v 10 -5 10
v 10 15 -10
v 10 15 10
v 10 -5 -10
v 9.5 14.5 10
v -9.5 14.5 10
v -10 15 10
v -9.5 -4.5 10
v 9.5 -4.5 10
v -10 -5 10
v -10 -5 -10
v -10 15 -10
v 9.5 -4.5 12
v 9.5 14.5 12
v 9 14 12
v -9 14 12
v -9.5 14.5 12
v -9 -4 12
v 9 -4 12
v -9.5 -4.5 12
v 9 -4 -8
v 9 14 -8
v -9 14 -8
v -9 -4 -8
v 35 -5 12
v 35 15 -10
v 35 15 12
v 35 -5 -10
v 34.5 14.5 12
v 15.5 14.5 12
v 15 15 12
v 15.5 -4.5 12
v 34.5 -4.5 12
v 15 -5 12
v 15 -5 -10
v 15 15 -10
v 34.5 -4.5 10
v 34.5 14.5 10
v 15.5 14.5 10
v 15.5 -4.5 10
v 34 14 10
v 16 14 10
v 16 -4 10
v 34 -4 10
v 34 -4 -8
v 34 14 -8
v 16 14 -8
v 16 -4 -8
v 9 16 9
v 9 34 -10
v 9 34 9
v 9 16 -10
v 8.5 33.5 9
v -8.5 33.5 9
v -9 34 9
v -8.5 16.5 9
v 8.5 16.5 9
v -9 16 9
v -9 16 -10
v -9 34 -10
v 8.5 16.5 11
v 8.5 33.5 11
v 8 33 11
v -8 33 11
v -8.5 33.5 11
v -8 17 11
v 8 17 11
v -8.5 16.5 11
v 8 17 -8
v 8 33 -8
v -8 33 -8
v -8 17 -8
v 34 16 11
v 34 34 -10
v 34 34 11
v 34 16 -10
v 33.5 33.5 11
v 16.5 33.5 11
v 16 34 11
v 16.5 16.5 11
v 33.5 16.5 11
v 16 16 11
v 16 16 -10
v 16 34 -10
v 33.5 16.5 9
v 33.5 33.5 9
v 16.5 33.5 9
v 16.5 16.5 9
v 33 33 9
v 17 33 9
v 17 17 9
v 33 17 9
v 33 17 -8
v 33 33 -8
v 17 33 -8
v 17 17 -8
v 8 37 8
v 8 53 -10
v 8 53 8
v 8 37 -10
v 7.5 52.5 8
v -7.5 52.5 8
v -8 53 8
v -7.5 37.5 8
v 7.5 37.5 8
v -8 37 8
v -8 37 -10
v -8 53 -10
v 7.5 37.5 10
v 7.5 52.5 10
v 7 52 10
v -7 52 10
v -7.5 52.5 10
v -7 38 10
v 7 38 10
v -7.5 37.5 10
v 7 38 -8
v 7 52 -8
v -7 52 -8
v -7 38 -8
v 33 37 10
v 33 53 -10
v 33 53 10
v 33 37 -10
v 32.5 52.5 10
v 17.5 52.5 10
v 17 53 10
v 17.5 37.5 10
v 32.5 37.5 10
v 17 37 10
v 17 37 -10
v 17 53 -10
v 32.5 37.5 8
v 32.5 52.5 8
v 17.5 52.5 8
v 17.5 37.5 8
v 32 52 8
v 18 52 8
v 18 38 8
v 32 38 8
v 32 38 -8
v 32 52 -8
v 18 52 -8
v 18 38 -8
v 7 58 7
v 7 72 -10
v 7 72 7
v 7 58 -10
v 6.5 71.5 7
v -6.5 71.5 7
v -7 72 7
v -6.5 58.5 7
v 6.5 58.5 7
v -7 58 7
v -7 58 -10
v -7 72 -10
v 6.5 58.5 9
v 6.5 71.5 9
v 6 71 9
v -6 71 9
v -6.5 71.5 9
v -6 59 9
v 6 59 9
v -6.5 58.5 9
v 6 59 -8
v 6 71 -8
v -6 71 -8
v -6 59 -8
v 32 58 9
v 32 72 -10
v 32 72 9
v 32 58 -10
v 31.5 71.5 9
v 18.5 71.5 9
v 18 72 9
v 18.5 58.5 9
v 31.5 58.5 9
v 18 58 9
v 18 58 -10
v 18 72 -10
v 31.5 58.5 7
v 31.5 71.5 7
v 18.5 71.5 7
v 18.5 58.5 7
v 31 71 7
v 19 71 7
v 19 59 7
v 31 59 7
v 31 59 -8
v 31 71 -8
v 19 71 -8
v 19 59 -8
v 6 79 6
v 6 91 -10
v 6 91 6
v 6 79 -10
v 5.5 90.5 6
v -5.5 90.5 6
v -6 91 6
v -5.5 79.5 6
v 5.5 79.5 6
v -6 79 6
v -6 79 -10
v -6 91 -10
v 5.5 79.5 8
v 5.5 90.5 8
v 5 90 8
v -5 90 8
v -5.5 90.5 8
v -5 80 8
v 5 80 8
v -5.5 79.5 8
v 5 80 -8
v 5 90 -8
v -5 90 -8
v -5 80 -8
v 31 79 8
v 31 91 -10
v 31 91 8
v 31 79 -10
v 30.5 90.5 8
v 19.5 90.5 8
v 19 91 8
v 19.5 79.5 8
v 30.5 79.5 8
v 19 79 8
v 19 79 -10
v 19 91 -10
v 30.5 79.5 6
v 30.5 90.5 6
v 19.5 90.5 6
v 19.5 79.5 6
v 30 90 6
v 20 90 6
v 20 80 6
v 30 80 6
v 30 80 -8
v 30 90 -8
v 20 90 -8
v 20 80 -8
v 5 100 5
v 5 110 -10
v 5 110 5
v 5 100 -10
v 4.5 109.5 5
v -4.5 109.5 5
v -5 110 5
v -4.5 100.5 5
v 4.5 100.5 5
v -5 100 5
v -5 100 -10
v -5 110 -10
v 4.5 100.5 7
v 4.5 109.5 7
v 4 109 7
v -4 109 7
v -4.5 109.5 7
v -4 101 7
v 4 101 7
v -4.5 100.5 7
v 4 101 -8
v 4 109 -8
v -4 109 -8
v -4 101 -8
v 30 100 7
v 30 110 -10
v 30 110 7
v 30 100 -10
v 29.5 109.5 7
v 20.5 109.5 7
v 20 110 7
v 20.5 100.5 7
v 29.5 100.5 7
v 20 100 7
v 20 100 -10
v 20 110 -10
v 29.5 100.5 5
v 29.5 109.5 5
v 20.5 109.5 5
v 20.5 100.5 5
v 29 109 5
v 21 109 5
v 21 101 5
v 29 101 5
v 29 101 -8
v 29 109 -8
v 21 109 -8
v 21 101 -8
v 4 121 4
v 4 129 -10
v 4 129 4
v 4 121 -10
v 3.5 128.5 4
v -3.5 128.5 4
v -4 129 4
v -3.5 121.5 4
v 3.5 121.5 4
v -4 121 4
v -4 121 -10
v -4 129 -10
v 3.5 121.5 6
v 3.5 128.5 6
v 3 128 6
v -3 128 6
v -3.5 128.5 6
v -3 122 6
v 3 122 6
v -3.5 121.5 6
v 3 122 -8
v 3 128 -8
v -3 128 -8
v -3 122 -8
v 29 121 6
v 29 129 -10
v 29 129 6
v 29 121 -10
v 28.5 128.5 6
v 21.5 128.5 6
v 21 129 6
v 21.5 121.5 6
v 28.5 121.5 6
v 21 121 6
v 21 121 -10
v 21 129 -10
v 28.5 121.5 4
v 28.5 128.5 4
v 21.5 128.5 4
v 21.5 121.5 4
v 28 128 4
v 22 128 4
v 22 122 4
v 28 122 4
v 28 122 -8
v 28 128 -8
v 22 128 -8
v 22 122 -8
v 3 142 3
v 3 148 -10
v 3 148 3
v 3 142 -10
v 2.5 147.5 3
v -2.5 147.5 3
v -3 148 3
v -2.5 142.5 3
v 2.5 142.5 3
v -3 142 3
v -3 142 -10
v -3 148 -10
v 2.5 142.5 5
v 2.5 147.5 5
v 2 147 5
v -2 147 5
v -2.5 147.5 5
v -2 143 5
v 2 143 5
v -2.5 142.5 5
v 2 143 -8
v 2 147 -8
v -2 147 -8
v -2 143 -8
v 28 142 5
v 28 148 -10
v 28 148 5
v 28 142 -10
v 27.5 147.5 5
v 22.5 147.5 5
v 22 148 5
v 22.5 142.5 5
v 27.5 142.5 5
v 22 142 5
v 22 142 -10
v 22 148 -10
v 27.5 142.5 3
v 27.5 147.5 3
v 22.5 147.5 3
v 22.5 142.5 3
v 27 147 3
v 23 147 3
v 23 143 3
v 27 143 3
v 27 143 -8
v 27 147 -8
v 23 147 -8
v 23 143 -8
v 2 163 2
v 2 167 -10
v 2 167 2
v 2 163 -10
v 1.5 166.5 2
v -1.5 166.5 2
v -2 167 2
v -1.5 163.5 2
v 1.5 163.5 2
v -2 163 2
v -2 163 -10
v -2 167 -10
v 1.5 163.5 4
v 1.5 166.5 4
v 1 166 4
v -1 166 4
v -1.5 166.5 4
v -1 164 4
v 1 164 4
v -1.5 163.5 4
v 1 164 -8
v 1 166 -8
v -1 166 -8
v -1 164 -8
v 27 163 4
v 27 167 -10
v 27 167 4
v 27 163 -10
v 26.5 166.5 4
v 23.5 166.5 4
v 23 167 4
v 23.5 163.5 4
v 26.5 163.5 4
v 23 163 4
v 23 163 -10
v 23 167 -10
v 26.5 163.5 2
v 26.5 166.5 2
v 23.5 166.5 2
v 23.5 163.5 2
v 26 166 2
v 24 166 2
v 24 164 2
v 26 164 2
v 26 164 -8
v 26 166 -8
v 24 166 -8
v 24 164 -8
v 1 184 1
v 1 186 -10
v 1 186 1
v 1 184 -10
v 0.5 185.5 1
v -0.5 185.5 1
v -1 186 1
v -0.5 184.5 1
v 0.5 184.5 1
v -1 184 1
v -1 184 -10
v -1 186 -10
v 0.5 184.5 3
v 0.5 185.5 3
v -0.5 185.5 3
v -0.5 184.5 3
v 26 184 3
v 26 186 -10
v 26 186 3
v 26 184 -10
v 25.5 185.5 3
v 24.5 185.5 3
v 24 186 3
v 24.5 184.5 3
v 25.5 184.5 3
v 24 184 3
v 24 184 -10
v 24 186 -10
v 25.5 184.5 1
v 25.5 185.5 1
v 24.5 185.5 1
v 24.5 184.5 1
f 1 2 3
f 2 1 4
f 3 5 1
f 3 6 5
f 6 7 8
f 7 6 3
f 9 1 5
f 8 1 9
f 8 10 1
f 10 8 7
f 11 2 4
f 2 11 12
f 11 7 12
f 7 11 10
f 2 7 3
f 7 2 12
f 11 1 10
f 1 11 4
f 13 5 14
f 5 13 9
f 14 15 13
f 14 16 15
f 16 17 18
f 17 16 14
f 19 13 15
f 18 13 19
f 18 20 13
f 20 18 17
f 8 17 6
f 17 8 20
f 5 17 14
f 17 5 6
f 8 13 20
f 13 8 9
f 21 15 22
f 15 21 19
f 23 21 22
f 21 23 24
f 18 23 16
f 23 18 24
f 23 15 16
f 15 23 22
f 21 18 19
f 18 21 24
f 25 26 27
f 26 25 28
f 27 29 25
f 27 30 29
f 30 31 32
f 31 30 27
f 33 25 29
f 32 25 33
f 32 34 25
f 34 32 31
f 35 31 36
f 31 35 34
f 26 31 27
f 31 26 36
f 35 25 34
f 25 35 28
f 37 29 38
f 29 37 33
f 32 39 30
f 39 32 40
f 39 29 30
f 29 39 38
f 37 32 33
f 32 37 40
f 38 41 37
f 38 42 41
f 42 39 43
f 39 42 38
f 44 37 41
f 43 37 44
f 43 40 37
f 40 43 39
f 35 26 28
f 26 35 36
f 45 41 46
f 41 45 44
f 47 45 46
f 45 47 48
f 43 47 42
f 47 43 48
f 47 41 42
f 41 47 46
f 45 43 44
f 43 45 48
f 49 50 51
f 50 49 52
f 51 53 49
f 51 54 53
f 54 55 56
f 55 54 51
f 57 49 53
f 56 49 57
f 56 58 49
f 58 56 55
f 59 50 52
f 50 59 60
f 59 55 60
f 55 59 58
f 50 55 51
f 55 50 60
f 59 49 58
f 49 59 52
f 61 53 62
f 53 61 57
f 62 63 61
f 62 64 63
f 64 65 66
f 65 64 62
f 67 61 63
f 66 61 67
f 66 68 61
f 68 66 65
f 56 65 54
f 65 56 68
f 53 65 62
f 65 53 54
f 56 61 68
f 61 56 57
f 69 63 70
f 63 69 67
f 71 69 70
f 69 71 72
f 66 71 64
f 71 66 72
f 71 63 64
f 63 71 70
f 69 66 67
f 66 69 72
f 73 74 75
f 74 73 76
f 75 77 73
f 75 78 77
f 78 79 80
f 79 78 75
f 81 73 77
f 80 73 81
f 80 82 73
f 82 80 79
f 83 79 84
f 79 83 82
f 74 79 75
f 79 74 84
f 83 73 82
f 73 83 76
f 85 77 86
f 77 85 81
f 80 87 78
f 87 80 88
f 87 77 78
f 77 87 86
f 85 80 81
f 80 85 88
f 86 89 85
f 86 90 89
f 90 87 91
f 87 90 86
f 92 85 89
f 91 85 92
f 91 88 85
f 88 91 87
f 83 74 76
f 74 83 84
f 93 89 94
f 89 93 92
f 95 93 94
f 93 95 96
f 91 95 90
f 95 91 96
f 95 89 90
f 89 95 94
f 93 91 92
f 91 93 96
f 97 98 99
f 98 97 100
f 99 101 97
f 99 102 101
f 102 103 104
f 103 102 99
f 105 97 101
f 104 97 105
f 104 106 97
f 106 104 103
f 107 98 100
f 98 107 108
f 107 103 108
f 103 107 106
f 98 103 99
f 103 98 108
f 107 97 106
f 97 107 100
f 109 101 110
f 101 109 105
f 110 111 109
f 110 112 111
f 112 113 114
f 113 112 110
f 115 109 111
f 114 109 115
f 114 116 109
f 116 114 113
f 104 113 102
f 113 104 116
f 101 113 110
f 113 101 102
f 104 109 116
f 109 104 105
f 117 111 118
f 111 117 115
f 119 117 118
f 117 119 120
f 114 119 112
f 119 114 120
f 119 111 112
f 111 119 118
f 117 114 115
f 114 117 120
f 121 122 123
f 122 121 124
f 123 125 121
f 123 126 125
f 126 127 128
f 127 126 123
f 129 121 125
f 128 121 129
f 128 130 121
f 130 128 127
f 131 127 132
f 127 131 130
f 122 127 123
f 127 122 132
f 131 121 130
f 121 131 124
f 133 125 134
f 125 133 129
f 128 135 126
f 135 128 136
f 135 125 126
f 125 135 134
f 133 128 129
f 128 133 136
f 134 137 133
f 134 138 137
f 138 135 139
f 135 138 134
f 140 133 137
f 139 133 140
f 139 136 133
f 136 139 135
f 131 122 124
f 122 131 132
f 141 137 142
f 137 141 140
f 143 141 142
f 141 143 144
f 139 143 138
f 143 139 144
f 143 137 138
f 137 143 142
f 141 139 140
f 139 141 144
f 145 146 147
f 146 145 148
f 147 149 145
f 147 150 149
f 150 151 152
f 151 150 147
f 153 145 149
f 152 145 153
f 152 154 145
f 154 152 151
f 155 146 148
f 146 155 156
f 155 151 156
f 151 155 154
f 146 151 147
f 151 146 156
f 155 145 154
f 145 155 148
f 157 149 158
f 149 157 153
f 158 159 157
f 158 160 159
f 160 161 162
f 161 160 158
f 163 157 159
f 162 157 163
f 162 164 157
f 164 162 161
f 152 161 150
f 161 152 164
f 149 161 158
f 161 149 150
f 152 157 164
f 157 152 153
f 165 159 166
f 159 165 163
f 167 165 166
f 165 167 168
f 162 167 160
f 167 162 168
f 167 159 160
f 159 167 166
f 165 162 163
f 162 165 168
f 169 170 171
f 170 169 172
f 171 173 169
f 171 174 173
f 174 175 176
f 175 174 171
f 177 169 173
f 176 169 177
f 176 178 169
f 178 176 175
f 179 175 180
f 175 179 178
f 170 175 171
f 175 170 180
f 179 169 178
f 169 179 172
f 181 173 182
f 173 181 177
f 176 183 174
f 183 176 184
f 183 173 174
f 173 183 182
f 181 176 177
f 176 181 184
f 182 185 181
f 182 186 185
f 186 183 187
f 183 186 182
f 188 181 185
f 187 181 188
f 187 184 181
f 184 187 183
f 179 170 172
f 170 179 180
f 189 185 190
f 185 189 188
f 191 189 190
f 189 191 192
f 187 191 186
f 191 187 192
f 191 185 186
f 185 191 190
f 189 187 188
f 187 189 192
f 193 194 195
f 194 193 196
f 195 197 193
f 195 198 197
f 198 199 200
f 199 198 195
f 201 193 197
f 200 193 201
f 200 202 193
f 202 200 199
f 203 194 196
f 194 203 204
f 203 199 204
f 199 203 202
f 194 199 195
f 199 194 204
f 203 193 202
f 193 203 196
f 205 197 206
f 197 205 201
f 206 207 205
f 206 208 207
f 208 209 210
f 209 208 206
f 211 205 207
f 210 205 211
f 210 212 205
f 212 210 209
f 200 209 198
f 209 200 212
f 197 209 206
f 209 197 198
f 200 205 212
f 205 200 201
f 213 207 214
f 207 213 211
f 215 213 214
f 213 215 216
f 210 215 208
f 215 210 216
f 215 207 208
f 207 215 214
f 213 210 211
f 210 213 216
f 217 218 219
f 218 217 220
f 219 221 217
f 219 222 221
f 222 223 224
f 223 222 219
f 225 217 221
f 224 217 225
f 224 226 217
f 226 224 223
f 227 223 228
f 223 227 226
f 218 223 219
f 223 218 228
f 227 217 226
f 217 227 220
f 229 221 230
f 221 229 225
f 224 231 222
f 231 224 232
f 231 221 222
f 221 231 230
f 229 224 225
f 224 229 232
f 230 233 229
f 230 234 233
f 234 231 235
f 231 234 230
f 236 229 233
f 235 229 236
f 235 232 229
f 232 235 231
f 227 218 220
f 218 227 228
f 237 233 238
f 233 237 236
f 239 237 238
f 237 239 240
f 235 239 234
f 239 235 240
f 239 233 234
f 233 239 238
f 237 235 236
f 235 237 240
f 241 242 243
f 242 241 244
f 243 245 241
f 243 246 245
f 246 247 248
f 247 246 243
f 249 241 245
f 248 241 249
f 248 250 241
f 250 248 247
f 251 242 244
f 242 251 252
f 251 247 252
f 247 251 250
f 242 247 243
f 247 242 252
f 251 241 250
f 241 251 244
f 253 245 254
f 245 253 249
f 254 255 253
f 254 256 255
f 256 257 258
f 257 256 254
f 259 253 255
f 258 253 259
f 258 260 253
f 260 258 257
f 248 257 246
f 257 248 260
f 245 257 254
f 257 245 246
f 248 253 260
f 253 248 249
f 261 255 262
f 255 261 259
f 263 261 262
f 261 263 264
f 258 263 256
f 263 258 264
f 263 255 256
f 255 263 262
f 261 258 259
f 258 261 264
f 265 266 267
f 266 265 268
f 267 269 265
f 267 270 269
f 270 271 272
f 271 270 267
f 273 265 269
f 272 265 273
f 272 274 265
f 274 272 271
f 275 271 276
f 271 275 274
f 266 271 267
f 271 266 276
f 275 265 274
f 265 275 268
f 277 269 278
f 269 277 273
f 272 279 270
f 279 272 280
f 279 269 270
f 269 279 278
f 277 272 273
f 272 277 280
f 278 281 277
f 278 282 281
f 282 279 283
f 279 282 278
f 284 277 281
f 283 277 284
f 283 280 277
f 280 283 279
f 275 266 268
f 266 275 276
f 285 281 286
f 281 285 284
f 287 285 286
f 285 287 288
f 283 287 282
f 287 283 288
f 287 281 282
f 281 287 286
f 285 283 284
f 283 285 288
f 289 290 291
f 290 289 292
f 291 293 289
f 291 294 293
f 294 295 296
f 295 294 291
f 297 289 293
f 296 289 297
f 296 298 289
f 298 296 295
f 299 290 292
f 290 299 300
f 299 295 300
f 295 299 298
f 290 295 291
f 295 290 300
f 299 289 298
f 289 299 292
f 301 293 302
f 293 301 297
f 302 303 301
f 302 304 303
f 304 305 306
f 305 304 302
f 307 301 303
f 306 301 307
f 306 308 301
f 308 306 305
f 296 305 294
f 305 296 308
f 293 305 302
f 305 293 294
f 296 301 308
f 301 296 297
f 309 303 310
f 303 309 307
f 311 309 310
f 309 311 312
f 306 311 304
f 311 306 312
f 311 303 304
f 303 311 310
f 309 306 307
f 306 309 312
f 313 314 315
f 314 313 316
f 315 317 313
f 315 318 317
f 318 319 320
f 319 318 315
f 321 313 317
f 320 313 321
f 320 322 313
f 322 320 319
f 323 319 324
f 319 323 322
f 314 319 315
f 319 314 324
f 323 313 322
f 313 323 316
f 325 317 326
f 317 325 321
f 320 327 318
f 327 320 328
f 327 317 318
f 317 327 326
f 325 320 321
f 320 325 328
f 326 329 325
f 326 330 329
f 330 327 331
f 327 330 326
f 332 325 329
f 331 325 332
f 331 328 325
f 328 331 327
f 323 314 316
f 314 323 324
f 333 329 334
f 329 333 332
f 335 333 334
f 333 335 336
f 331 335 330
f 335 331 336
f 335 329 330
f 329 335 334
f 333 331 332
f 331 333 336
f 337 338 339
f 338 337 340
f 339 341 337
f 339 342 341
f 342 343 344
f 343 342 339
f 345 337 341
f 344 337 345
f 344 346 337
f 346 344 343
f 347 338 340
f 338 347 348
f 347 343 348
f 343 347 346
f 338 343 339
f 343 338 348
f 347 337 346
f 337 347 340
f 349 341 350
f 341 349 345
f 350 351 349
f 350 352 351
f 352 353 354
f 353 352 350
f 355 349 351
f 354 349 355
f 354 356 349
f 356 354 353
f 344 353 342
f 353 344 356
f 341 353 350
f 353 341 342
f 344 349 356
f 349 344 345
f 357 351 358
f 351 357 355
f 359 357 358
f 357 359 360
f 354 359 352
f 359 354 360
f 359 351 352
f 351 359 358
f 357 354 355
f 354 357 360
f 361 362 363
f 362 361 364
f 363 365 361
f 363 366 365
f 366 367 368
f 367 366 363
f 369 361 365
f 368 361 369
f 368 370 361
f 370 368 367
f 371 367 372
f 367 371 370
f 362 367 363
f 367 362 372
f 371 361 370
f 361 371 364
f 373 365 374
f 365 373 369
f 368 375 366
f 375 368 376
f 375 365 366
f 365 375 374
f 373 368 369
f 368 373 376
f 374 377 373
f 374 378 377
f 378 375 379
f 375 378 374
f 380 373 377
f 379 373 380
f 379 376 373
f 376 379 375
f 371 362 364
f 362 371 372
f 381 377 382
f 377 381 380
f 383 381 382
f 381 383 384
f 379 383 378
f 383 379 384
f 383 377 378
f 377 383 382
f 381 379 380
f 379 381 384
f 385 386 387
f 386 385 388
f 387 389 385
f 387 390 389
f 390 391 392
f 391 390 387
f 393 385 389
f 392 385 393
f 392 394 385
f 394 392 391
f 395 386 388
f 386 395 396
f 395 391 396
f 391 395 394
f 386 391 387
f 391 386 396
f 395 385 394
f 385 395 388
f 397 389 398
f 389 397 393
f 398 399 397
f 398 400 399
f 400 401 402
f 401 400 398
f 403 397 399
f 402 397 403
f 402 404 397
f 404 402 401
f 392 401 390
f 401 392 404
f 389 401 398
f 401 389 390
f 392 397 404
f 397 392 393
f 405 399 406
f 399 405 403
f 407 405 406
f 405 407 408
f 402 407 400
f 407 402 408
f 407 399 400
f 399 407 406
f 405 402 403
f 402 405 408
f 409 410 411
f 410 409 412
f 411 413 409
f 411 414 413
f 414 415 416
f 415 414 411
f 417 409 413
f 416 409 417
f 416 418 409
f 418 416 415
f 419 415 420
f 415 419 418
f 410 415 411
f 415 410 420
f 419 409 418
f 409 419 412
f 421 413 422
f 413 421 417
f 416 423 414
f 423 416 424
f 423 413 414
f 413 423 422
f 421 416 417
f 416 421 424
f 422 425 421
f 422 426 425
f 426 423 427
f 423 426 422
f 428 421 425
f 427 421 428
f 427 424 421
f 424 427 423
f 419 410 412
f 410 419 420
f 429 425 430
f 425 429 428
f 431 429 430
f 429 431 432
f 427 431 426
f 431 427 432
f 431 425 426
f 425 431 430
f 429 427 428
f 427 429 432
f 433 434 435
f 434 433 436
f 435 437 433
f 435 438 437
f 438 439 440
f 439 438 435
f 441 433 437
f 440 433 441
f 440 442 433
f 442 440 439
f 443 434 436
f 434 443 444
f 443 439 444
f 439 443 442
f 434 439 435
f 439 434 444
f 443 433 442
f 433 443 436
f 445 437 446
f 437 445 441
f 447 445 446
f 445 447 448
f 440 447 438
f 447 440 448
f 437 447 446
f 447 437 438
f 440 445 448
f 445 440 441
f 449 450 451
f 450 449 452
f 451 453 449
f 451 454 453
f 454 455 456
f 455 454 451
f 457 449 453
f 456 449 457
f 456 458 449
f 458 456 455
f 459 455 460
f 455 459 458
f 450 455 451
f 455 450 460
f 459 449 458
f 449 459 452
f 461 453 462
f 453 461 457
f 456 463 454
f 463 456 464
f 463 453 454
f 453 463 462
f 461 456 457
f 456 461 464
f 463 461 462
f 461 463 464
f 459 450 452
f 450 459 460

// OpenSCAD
length=20;//diameter for cylinders
width=20;
height=40;
thickness=2;
Number_of_dolls=10;
shape="cube";//"cylinder" or "cube"
$fn=50;
if(shape=="cube"){
        for(i=[0:Number_of_dolls-1])
                if(length-i*thickness>0&&width-i*thickness>0&&height/2-i*thickness/2>1){
                        
                        
                        
                        translate([0,width*i+5,-i*thickness/4]){
                                difference(){
                                        union(){
                                                cube([length-i*thickness,width-i*thickness,height/2-i*thickness/2],center=true);
                                                translate([0,0,thickness]){
                                                        cube([length-thickness/2-i*thickness,width-thickness/2-i*thickness,height/2-i*thickness/2],center=true);
                                                }
                                        }
                                        translate([0,0,thickness]){
                                                cube([length-thickness-i*thickness,width-thickness-i*thickness,height/2-i*thickness/2],center=true);
                                        }
                                }
                                translate([length+5,0,0]){
                                        difference(){
                                                union(){
                                                        cube([length-i*thickness,width-i*thickness,height/2-i*thickness/2],center=true);
                                                        translate([0,0,thickness]){
                                                                difference(){
                                                                        cube([length-i*thickness,width-i*thickness,height/2-i*thickness/2],center=true);
                                                                        cube([length-thickness/2-i*thickness,width-thickness/2-i*thickness,height/2-i*thickness/2],center=true);
                                                                }
                                                        }
                                                }
                                                translate([0,0,thickness]){
                                                        cube([length-thickness-i*thickness,width-thickness-i*thickness,height/2-i*thickness/2],center=true);
                                                }
                                        }
                                }
                        }
        }
}

if(shape=="cylinder"){
        for(i=[0:Number_of_dolls-1])
                if(length-i*thickness>0&&width-i*thickness>0&&height/2-i*thickness/2>1){
                        
                        
//cylinder(h = height, r1 = BottomRadius, r2 = TopRadius, center = true/false);                        
                        translate([0,width*i+5,-i*thickness/4]){
                                difference(){
                                        union(){
                                                cylinder(d=length-i*thickness,h=height/2-i*thickness/2,center=true);
                                                translate([0,0,thickness]){
                                                        cylinder(d=length-thickness/2-i*thickness,h=height/2-i*thickness/2,center=true);
                                                }
                                        }
                                        translate([0,0,thickness]){
                                                cylinder(d=length-thickness-i*thickness,h= height/2-i*thickness/2,center=true);
                                        }
                                }
                                translate([length+5,0,0]){
                                        difference(){
                                                union(){
                                                        cylinder(d=length-i*thickness,h=height/2-i*thickness/2,center=true);
                                                        translate([0,0,thickness]){
                                                                difference(){
                                                                        cylinder(d=length-i*thickness,h=height/2-i*thickness/2,center=true);
                                                                        cylinder(d=length-thickness/2-i*thickness,h=height/2-i*thickness/2,center=true);
                                                                }
                                                        }
                                                }
                                                translate([0,0,thickness]){
                                                        cylinder(d=length-thickness-i*thickness,h=height/2-i*thickness/2,center=true);
                                                }
                                        }
                                }
                        }
        }
}
